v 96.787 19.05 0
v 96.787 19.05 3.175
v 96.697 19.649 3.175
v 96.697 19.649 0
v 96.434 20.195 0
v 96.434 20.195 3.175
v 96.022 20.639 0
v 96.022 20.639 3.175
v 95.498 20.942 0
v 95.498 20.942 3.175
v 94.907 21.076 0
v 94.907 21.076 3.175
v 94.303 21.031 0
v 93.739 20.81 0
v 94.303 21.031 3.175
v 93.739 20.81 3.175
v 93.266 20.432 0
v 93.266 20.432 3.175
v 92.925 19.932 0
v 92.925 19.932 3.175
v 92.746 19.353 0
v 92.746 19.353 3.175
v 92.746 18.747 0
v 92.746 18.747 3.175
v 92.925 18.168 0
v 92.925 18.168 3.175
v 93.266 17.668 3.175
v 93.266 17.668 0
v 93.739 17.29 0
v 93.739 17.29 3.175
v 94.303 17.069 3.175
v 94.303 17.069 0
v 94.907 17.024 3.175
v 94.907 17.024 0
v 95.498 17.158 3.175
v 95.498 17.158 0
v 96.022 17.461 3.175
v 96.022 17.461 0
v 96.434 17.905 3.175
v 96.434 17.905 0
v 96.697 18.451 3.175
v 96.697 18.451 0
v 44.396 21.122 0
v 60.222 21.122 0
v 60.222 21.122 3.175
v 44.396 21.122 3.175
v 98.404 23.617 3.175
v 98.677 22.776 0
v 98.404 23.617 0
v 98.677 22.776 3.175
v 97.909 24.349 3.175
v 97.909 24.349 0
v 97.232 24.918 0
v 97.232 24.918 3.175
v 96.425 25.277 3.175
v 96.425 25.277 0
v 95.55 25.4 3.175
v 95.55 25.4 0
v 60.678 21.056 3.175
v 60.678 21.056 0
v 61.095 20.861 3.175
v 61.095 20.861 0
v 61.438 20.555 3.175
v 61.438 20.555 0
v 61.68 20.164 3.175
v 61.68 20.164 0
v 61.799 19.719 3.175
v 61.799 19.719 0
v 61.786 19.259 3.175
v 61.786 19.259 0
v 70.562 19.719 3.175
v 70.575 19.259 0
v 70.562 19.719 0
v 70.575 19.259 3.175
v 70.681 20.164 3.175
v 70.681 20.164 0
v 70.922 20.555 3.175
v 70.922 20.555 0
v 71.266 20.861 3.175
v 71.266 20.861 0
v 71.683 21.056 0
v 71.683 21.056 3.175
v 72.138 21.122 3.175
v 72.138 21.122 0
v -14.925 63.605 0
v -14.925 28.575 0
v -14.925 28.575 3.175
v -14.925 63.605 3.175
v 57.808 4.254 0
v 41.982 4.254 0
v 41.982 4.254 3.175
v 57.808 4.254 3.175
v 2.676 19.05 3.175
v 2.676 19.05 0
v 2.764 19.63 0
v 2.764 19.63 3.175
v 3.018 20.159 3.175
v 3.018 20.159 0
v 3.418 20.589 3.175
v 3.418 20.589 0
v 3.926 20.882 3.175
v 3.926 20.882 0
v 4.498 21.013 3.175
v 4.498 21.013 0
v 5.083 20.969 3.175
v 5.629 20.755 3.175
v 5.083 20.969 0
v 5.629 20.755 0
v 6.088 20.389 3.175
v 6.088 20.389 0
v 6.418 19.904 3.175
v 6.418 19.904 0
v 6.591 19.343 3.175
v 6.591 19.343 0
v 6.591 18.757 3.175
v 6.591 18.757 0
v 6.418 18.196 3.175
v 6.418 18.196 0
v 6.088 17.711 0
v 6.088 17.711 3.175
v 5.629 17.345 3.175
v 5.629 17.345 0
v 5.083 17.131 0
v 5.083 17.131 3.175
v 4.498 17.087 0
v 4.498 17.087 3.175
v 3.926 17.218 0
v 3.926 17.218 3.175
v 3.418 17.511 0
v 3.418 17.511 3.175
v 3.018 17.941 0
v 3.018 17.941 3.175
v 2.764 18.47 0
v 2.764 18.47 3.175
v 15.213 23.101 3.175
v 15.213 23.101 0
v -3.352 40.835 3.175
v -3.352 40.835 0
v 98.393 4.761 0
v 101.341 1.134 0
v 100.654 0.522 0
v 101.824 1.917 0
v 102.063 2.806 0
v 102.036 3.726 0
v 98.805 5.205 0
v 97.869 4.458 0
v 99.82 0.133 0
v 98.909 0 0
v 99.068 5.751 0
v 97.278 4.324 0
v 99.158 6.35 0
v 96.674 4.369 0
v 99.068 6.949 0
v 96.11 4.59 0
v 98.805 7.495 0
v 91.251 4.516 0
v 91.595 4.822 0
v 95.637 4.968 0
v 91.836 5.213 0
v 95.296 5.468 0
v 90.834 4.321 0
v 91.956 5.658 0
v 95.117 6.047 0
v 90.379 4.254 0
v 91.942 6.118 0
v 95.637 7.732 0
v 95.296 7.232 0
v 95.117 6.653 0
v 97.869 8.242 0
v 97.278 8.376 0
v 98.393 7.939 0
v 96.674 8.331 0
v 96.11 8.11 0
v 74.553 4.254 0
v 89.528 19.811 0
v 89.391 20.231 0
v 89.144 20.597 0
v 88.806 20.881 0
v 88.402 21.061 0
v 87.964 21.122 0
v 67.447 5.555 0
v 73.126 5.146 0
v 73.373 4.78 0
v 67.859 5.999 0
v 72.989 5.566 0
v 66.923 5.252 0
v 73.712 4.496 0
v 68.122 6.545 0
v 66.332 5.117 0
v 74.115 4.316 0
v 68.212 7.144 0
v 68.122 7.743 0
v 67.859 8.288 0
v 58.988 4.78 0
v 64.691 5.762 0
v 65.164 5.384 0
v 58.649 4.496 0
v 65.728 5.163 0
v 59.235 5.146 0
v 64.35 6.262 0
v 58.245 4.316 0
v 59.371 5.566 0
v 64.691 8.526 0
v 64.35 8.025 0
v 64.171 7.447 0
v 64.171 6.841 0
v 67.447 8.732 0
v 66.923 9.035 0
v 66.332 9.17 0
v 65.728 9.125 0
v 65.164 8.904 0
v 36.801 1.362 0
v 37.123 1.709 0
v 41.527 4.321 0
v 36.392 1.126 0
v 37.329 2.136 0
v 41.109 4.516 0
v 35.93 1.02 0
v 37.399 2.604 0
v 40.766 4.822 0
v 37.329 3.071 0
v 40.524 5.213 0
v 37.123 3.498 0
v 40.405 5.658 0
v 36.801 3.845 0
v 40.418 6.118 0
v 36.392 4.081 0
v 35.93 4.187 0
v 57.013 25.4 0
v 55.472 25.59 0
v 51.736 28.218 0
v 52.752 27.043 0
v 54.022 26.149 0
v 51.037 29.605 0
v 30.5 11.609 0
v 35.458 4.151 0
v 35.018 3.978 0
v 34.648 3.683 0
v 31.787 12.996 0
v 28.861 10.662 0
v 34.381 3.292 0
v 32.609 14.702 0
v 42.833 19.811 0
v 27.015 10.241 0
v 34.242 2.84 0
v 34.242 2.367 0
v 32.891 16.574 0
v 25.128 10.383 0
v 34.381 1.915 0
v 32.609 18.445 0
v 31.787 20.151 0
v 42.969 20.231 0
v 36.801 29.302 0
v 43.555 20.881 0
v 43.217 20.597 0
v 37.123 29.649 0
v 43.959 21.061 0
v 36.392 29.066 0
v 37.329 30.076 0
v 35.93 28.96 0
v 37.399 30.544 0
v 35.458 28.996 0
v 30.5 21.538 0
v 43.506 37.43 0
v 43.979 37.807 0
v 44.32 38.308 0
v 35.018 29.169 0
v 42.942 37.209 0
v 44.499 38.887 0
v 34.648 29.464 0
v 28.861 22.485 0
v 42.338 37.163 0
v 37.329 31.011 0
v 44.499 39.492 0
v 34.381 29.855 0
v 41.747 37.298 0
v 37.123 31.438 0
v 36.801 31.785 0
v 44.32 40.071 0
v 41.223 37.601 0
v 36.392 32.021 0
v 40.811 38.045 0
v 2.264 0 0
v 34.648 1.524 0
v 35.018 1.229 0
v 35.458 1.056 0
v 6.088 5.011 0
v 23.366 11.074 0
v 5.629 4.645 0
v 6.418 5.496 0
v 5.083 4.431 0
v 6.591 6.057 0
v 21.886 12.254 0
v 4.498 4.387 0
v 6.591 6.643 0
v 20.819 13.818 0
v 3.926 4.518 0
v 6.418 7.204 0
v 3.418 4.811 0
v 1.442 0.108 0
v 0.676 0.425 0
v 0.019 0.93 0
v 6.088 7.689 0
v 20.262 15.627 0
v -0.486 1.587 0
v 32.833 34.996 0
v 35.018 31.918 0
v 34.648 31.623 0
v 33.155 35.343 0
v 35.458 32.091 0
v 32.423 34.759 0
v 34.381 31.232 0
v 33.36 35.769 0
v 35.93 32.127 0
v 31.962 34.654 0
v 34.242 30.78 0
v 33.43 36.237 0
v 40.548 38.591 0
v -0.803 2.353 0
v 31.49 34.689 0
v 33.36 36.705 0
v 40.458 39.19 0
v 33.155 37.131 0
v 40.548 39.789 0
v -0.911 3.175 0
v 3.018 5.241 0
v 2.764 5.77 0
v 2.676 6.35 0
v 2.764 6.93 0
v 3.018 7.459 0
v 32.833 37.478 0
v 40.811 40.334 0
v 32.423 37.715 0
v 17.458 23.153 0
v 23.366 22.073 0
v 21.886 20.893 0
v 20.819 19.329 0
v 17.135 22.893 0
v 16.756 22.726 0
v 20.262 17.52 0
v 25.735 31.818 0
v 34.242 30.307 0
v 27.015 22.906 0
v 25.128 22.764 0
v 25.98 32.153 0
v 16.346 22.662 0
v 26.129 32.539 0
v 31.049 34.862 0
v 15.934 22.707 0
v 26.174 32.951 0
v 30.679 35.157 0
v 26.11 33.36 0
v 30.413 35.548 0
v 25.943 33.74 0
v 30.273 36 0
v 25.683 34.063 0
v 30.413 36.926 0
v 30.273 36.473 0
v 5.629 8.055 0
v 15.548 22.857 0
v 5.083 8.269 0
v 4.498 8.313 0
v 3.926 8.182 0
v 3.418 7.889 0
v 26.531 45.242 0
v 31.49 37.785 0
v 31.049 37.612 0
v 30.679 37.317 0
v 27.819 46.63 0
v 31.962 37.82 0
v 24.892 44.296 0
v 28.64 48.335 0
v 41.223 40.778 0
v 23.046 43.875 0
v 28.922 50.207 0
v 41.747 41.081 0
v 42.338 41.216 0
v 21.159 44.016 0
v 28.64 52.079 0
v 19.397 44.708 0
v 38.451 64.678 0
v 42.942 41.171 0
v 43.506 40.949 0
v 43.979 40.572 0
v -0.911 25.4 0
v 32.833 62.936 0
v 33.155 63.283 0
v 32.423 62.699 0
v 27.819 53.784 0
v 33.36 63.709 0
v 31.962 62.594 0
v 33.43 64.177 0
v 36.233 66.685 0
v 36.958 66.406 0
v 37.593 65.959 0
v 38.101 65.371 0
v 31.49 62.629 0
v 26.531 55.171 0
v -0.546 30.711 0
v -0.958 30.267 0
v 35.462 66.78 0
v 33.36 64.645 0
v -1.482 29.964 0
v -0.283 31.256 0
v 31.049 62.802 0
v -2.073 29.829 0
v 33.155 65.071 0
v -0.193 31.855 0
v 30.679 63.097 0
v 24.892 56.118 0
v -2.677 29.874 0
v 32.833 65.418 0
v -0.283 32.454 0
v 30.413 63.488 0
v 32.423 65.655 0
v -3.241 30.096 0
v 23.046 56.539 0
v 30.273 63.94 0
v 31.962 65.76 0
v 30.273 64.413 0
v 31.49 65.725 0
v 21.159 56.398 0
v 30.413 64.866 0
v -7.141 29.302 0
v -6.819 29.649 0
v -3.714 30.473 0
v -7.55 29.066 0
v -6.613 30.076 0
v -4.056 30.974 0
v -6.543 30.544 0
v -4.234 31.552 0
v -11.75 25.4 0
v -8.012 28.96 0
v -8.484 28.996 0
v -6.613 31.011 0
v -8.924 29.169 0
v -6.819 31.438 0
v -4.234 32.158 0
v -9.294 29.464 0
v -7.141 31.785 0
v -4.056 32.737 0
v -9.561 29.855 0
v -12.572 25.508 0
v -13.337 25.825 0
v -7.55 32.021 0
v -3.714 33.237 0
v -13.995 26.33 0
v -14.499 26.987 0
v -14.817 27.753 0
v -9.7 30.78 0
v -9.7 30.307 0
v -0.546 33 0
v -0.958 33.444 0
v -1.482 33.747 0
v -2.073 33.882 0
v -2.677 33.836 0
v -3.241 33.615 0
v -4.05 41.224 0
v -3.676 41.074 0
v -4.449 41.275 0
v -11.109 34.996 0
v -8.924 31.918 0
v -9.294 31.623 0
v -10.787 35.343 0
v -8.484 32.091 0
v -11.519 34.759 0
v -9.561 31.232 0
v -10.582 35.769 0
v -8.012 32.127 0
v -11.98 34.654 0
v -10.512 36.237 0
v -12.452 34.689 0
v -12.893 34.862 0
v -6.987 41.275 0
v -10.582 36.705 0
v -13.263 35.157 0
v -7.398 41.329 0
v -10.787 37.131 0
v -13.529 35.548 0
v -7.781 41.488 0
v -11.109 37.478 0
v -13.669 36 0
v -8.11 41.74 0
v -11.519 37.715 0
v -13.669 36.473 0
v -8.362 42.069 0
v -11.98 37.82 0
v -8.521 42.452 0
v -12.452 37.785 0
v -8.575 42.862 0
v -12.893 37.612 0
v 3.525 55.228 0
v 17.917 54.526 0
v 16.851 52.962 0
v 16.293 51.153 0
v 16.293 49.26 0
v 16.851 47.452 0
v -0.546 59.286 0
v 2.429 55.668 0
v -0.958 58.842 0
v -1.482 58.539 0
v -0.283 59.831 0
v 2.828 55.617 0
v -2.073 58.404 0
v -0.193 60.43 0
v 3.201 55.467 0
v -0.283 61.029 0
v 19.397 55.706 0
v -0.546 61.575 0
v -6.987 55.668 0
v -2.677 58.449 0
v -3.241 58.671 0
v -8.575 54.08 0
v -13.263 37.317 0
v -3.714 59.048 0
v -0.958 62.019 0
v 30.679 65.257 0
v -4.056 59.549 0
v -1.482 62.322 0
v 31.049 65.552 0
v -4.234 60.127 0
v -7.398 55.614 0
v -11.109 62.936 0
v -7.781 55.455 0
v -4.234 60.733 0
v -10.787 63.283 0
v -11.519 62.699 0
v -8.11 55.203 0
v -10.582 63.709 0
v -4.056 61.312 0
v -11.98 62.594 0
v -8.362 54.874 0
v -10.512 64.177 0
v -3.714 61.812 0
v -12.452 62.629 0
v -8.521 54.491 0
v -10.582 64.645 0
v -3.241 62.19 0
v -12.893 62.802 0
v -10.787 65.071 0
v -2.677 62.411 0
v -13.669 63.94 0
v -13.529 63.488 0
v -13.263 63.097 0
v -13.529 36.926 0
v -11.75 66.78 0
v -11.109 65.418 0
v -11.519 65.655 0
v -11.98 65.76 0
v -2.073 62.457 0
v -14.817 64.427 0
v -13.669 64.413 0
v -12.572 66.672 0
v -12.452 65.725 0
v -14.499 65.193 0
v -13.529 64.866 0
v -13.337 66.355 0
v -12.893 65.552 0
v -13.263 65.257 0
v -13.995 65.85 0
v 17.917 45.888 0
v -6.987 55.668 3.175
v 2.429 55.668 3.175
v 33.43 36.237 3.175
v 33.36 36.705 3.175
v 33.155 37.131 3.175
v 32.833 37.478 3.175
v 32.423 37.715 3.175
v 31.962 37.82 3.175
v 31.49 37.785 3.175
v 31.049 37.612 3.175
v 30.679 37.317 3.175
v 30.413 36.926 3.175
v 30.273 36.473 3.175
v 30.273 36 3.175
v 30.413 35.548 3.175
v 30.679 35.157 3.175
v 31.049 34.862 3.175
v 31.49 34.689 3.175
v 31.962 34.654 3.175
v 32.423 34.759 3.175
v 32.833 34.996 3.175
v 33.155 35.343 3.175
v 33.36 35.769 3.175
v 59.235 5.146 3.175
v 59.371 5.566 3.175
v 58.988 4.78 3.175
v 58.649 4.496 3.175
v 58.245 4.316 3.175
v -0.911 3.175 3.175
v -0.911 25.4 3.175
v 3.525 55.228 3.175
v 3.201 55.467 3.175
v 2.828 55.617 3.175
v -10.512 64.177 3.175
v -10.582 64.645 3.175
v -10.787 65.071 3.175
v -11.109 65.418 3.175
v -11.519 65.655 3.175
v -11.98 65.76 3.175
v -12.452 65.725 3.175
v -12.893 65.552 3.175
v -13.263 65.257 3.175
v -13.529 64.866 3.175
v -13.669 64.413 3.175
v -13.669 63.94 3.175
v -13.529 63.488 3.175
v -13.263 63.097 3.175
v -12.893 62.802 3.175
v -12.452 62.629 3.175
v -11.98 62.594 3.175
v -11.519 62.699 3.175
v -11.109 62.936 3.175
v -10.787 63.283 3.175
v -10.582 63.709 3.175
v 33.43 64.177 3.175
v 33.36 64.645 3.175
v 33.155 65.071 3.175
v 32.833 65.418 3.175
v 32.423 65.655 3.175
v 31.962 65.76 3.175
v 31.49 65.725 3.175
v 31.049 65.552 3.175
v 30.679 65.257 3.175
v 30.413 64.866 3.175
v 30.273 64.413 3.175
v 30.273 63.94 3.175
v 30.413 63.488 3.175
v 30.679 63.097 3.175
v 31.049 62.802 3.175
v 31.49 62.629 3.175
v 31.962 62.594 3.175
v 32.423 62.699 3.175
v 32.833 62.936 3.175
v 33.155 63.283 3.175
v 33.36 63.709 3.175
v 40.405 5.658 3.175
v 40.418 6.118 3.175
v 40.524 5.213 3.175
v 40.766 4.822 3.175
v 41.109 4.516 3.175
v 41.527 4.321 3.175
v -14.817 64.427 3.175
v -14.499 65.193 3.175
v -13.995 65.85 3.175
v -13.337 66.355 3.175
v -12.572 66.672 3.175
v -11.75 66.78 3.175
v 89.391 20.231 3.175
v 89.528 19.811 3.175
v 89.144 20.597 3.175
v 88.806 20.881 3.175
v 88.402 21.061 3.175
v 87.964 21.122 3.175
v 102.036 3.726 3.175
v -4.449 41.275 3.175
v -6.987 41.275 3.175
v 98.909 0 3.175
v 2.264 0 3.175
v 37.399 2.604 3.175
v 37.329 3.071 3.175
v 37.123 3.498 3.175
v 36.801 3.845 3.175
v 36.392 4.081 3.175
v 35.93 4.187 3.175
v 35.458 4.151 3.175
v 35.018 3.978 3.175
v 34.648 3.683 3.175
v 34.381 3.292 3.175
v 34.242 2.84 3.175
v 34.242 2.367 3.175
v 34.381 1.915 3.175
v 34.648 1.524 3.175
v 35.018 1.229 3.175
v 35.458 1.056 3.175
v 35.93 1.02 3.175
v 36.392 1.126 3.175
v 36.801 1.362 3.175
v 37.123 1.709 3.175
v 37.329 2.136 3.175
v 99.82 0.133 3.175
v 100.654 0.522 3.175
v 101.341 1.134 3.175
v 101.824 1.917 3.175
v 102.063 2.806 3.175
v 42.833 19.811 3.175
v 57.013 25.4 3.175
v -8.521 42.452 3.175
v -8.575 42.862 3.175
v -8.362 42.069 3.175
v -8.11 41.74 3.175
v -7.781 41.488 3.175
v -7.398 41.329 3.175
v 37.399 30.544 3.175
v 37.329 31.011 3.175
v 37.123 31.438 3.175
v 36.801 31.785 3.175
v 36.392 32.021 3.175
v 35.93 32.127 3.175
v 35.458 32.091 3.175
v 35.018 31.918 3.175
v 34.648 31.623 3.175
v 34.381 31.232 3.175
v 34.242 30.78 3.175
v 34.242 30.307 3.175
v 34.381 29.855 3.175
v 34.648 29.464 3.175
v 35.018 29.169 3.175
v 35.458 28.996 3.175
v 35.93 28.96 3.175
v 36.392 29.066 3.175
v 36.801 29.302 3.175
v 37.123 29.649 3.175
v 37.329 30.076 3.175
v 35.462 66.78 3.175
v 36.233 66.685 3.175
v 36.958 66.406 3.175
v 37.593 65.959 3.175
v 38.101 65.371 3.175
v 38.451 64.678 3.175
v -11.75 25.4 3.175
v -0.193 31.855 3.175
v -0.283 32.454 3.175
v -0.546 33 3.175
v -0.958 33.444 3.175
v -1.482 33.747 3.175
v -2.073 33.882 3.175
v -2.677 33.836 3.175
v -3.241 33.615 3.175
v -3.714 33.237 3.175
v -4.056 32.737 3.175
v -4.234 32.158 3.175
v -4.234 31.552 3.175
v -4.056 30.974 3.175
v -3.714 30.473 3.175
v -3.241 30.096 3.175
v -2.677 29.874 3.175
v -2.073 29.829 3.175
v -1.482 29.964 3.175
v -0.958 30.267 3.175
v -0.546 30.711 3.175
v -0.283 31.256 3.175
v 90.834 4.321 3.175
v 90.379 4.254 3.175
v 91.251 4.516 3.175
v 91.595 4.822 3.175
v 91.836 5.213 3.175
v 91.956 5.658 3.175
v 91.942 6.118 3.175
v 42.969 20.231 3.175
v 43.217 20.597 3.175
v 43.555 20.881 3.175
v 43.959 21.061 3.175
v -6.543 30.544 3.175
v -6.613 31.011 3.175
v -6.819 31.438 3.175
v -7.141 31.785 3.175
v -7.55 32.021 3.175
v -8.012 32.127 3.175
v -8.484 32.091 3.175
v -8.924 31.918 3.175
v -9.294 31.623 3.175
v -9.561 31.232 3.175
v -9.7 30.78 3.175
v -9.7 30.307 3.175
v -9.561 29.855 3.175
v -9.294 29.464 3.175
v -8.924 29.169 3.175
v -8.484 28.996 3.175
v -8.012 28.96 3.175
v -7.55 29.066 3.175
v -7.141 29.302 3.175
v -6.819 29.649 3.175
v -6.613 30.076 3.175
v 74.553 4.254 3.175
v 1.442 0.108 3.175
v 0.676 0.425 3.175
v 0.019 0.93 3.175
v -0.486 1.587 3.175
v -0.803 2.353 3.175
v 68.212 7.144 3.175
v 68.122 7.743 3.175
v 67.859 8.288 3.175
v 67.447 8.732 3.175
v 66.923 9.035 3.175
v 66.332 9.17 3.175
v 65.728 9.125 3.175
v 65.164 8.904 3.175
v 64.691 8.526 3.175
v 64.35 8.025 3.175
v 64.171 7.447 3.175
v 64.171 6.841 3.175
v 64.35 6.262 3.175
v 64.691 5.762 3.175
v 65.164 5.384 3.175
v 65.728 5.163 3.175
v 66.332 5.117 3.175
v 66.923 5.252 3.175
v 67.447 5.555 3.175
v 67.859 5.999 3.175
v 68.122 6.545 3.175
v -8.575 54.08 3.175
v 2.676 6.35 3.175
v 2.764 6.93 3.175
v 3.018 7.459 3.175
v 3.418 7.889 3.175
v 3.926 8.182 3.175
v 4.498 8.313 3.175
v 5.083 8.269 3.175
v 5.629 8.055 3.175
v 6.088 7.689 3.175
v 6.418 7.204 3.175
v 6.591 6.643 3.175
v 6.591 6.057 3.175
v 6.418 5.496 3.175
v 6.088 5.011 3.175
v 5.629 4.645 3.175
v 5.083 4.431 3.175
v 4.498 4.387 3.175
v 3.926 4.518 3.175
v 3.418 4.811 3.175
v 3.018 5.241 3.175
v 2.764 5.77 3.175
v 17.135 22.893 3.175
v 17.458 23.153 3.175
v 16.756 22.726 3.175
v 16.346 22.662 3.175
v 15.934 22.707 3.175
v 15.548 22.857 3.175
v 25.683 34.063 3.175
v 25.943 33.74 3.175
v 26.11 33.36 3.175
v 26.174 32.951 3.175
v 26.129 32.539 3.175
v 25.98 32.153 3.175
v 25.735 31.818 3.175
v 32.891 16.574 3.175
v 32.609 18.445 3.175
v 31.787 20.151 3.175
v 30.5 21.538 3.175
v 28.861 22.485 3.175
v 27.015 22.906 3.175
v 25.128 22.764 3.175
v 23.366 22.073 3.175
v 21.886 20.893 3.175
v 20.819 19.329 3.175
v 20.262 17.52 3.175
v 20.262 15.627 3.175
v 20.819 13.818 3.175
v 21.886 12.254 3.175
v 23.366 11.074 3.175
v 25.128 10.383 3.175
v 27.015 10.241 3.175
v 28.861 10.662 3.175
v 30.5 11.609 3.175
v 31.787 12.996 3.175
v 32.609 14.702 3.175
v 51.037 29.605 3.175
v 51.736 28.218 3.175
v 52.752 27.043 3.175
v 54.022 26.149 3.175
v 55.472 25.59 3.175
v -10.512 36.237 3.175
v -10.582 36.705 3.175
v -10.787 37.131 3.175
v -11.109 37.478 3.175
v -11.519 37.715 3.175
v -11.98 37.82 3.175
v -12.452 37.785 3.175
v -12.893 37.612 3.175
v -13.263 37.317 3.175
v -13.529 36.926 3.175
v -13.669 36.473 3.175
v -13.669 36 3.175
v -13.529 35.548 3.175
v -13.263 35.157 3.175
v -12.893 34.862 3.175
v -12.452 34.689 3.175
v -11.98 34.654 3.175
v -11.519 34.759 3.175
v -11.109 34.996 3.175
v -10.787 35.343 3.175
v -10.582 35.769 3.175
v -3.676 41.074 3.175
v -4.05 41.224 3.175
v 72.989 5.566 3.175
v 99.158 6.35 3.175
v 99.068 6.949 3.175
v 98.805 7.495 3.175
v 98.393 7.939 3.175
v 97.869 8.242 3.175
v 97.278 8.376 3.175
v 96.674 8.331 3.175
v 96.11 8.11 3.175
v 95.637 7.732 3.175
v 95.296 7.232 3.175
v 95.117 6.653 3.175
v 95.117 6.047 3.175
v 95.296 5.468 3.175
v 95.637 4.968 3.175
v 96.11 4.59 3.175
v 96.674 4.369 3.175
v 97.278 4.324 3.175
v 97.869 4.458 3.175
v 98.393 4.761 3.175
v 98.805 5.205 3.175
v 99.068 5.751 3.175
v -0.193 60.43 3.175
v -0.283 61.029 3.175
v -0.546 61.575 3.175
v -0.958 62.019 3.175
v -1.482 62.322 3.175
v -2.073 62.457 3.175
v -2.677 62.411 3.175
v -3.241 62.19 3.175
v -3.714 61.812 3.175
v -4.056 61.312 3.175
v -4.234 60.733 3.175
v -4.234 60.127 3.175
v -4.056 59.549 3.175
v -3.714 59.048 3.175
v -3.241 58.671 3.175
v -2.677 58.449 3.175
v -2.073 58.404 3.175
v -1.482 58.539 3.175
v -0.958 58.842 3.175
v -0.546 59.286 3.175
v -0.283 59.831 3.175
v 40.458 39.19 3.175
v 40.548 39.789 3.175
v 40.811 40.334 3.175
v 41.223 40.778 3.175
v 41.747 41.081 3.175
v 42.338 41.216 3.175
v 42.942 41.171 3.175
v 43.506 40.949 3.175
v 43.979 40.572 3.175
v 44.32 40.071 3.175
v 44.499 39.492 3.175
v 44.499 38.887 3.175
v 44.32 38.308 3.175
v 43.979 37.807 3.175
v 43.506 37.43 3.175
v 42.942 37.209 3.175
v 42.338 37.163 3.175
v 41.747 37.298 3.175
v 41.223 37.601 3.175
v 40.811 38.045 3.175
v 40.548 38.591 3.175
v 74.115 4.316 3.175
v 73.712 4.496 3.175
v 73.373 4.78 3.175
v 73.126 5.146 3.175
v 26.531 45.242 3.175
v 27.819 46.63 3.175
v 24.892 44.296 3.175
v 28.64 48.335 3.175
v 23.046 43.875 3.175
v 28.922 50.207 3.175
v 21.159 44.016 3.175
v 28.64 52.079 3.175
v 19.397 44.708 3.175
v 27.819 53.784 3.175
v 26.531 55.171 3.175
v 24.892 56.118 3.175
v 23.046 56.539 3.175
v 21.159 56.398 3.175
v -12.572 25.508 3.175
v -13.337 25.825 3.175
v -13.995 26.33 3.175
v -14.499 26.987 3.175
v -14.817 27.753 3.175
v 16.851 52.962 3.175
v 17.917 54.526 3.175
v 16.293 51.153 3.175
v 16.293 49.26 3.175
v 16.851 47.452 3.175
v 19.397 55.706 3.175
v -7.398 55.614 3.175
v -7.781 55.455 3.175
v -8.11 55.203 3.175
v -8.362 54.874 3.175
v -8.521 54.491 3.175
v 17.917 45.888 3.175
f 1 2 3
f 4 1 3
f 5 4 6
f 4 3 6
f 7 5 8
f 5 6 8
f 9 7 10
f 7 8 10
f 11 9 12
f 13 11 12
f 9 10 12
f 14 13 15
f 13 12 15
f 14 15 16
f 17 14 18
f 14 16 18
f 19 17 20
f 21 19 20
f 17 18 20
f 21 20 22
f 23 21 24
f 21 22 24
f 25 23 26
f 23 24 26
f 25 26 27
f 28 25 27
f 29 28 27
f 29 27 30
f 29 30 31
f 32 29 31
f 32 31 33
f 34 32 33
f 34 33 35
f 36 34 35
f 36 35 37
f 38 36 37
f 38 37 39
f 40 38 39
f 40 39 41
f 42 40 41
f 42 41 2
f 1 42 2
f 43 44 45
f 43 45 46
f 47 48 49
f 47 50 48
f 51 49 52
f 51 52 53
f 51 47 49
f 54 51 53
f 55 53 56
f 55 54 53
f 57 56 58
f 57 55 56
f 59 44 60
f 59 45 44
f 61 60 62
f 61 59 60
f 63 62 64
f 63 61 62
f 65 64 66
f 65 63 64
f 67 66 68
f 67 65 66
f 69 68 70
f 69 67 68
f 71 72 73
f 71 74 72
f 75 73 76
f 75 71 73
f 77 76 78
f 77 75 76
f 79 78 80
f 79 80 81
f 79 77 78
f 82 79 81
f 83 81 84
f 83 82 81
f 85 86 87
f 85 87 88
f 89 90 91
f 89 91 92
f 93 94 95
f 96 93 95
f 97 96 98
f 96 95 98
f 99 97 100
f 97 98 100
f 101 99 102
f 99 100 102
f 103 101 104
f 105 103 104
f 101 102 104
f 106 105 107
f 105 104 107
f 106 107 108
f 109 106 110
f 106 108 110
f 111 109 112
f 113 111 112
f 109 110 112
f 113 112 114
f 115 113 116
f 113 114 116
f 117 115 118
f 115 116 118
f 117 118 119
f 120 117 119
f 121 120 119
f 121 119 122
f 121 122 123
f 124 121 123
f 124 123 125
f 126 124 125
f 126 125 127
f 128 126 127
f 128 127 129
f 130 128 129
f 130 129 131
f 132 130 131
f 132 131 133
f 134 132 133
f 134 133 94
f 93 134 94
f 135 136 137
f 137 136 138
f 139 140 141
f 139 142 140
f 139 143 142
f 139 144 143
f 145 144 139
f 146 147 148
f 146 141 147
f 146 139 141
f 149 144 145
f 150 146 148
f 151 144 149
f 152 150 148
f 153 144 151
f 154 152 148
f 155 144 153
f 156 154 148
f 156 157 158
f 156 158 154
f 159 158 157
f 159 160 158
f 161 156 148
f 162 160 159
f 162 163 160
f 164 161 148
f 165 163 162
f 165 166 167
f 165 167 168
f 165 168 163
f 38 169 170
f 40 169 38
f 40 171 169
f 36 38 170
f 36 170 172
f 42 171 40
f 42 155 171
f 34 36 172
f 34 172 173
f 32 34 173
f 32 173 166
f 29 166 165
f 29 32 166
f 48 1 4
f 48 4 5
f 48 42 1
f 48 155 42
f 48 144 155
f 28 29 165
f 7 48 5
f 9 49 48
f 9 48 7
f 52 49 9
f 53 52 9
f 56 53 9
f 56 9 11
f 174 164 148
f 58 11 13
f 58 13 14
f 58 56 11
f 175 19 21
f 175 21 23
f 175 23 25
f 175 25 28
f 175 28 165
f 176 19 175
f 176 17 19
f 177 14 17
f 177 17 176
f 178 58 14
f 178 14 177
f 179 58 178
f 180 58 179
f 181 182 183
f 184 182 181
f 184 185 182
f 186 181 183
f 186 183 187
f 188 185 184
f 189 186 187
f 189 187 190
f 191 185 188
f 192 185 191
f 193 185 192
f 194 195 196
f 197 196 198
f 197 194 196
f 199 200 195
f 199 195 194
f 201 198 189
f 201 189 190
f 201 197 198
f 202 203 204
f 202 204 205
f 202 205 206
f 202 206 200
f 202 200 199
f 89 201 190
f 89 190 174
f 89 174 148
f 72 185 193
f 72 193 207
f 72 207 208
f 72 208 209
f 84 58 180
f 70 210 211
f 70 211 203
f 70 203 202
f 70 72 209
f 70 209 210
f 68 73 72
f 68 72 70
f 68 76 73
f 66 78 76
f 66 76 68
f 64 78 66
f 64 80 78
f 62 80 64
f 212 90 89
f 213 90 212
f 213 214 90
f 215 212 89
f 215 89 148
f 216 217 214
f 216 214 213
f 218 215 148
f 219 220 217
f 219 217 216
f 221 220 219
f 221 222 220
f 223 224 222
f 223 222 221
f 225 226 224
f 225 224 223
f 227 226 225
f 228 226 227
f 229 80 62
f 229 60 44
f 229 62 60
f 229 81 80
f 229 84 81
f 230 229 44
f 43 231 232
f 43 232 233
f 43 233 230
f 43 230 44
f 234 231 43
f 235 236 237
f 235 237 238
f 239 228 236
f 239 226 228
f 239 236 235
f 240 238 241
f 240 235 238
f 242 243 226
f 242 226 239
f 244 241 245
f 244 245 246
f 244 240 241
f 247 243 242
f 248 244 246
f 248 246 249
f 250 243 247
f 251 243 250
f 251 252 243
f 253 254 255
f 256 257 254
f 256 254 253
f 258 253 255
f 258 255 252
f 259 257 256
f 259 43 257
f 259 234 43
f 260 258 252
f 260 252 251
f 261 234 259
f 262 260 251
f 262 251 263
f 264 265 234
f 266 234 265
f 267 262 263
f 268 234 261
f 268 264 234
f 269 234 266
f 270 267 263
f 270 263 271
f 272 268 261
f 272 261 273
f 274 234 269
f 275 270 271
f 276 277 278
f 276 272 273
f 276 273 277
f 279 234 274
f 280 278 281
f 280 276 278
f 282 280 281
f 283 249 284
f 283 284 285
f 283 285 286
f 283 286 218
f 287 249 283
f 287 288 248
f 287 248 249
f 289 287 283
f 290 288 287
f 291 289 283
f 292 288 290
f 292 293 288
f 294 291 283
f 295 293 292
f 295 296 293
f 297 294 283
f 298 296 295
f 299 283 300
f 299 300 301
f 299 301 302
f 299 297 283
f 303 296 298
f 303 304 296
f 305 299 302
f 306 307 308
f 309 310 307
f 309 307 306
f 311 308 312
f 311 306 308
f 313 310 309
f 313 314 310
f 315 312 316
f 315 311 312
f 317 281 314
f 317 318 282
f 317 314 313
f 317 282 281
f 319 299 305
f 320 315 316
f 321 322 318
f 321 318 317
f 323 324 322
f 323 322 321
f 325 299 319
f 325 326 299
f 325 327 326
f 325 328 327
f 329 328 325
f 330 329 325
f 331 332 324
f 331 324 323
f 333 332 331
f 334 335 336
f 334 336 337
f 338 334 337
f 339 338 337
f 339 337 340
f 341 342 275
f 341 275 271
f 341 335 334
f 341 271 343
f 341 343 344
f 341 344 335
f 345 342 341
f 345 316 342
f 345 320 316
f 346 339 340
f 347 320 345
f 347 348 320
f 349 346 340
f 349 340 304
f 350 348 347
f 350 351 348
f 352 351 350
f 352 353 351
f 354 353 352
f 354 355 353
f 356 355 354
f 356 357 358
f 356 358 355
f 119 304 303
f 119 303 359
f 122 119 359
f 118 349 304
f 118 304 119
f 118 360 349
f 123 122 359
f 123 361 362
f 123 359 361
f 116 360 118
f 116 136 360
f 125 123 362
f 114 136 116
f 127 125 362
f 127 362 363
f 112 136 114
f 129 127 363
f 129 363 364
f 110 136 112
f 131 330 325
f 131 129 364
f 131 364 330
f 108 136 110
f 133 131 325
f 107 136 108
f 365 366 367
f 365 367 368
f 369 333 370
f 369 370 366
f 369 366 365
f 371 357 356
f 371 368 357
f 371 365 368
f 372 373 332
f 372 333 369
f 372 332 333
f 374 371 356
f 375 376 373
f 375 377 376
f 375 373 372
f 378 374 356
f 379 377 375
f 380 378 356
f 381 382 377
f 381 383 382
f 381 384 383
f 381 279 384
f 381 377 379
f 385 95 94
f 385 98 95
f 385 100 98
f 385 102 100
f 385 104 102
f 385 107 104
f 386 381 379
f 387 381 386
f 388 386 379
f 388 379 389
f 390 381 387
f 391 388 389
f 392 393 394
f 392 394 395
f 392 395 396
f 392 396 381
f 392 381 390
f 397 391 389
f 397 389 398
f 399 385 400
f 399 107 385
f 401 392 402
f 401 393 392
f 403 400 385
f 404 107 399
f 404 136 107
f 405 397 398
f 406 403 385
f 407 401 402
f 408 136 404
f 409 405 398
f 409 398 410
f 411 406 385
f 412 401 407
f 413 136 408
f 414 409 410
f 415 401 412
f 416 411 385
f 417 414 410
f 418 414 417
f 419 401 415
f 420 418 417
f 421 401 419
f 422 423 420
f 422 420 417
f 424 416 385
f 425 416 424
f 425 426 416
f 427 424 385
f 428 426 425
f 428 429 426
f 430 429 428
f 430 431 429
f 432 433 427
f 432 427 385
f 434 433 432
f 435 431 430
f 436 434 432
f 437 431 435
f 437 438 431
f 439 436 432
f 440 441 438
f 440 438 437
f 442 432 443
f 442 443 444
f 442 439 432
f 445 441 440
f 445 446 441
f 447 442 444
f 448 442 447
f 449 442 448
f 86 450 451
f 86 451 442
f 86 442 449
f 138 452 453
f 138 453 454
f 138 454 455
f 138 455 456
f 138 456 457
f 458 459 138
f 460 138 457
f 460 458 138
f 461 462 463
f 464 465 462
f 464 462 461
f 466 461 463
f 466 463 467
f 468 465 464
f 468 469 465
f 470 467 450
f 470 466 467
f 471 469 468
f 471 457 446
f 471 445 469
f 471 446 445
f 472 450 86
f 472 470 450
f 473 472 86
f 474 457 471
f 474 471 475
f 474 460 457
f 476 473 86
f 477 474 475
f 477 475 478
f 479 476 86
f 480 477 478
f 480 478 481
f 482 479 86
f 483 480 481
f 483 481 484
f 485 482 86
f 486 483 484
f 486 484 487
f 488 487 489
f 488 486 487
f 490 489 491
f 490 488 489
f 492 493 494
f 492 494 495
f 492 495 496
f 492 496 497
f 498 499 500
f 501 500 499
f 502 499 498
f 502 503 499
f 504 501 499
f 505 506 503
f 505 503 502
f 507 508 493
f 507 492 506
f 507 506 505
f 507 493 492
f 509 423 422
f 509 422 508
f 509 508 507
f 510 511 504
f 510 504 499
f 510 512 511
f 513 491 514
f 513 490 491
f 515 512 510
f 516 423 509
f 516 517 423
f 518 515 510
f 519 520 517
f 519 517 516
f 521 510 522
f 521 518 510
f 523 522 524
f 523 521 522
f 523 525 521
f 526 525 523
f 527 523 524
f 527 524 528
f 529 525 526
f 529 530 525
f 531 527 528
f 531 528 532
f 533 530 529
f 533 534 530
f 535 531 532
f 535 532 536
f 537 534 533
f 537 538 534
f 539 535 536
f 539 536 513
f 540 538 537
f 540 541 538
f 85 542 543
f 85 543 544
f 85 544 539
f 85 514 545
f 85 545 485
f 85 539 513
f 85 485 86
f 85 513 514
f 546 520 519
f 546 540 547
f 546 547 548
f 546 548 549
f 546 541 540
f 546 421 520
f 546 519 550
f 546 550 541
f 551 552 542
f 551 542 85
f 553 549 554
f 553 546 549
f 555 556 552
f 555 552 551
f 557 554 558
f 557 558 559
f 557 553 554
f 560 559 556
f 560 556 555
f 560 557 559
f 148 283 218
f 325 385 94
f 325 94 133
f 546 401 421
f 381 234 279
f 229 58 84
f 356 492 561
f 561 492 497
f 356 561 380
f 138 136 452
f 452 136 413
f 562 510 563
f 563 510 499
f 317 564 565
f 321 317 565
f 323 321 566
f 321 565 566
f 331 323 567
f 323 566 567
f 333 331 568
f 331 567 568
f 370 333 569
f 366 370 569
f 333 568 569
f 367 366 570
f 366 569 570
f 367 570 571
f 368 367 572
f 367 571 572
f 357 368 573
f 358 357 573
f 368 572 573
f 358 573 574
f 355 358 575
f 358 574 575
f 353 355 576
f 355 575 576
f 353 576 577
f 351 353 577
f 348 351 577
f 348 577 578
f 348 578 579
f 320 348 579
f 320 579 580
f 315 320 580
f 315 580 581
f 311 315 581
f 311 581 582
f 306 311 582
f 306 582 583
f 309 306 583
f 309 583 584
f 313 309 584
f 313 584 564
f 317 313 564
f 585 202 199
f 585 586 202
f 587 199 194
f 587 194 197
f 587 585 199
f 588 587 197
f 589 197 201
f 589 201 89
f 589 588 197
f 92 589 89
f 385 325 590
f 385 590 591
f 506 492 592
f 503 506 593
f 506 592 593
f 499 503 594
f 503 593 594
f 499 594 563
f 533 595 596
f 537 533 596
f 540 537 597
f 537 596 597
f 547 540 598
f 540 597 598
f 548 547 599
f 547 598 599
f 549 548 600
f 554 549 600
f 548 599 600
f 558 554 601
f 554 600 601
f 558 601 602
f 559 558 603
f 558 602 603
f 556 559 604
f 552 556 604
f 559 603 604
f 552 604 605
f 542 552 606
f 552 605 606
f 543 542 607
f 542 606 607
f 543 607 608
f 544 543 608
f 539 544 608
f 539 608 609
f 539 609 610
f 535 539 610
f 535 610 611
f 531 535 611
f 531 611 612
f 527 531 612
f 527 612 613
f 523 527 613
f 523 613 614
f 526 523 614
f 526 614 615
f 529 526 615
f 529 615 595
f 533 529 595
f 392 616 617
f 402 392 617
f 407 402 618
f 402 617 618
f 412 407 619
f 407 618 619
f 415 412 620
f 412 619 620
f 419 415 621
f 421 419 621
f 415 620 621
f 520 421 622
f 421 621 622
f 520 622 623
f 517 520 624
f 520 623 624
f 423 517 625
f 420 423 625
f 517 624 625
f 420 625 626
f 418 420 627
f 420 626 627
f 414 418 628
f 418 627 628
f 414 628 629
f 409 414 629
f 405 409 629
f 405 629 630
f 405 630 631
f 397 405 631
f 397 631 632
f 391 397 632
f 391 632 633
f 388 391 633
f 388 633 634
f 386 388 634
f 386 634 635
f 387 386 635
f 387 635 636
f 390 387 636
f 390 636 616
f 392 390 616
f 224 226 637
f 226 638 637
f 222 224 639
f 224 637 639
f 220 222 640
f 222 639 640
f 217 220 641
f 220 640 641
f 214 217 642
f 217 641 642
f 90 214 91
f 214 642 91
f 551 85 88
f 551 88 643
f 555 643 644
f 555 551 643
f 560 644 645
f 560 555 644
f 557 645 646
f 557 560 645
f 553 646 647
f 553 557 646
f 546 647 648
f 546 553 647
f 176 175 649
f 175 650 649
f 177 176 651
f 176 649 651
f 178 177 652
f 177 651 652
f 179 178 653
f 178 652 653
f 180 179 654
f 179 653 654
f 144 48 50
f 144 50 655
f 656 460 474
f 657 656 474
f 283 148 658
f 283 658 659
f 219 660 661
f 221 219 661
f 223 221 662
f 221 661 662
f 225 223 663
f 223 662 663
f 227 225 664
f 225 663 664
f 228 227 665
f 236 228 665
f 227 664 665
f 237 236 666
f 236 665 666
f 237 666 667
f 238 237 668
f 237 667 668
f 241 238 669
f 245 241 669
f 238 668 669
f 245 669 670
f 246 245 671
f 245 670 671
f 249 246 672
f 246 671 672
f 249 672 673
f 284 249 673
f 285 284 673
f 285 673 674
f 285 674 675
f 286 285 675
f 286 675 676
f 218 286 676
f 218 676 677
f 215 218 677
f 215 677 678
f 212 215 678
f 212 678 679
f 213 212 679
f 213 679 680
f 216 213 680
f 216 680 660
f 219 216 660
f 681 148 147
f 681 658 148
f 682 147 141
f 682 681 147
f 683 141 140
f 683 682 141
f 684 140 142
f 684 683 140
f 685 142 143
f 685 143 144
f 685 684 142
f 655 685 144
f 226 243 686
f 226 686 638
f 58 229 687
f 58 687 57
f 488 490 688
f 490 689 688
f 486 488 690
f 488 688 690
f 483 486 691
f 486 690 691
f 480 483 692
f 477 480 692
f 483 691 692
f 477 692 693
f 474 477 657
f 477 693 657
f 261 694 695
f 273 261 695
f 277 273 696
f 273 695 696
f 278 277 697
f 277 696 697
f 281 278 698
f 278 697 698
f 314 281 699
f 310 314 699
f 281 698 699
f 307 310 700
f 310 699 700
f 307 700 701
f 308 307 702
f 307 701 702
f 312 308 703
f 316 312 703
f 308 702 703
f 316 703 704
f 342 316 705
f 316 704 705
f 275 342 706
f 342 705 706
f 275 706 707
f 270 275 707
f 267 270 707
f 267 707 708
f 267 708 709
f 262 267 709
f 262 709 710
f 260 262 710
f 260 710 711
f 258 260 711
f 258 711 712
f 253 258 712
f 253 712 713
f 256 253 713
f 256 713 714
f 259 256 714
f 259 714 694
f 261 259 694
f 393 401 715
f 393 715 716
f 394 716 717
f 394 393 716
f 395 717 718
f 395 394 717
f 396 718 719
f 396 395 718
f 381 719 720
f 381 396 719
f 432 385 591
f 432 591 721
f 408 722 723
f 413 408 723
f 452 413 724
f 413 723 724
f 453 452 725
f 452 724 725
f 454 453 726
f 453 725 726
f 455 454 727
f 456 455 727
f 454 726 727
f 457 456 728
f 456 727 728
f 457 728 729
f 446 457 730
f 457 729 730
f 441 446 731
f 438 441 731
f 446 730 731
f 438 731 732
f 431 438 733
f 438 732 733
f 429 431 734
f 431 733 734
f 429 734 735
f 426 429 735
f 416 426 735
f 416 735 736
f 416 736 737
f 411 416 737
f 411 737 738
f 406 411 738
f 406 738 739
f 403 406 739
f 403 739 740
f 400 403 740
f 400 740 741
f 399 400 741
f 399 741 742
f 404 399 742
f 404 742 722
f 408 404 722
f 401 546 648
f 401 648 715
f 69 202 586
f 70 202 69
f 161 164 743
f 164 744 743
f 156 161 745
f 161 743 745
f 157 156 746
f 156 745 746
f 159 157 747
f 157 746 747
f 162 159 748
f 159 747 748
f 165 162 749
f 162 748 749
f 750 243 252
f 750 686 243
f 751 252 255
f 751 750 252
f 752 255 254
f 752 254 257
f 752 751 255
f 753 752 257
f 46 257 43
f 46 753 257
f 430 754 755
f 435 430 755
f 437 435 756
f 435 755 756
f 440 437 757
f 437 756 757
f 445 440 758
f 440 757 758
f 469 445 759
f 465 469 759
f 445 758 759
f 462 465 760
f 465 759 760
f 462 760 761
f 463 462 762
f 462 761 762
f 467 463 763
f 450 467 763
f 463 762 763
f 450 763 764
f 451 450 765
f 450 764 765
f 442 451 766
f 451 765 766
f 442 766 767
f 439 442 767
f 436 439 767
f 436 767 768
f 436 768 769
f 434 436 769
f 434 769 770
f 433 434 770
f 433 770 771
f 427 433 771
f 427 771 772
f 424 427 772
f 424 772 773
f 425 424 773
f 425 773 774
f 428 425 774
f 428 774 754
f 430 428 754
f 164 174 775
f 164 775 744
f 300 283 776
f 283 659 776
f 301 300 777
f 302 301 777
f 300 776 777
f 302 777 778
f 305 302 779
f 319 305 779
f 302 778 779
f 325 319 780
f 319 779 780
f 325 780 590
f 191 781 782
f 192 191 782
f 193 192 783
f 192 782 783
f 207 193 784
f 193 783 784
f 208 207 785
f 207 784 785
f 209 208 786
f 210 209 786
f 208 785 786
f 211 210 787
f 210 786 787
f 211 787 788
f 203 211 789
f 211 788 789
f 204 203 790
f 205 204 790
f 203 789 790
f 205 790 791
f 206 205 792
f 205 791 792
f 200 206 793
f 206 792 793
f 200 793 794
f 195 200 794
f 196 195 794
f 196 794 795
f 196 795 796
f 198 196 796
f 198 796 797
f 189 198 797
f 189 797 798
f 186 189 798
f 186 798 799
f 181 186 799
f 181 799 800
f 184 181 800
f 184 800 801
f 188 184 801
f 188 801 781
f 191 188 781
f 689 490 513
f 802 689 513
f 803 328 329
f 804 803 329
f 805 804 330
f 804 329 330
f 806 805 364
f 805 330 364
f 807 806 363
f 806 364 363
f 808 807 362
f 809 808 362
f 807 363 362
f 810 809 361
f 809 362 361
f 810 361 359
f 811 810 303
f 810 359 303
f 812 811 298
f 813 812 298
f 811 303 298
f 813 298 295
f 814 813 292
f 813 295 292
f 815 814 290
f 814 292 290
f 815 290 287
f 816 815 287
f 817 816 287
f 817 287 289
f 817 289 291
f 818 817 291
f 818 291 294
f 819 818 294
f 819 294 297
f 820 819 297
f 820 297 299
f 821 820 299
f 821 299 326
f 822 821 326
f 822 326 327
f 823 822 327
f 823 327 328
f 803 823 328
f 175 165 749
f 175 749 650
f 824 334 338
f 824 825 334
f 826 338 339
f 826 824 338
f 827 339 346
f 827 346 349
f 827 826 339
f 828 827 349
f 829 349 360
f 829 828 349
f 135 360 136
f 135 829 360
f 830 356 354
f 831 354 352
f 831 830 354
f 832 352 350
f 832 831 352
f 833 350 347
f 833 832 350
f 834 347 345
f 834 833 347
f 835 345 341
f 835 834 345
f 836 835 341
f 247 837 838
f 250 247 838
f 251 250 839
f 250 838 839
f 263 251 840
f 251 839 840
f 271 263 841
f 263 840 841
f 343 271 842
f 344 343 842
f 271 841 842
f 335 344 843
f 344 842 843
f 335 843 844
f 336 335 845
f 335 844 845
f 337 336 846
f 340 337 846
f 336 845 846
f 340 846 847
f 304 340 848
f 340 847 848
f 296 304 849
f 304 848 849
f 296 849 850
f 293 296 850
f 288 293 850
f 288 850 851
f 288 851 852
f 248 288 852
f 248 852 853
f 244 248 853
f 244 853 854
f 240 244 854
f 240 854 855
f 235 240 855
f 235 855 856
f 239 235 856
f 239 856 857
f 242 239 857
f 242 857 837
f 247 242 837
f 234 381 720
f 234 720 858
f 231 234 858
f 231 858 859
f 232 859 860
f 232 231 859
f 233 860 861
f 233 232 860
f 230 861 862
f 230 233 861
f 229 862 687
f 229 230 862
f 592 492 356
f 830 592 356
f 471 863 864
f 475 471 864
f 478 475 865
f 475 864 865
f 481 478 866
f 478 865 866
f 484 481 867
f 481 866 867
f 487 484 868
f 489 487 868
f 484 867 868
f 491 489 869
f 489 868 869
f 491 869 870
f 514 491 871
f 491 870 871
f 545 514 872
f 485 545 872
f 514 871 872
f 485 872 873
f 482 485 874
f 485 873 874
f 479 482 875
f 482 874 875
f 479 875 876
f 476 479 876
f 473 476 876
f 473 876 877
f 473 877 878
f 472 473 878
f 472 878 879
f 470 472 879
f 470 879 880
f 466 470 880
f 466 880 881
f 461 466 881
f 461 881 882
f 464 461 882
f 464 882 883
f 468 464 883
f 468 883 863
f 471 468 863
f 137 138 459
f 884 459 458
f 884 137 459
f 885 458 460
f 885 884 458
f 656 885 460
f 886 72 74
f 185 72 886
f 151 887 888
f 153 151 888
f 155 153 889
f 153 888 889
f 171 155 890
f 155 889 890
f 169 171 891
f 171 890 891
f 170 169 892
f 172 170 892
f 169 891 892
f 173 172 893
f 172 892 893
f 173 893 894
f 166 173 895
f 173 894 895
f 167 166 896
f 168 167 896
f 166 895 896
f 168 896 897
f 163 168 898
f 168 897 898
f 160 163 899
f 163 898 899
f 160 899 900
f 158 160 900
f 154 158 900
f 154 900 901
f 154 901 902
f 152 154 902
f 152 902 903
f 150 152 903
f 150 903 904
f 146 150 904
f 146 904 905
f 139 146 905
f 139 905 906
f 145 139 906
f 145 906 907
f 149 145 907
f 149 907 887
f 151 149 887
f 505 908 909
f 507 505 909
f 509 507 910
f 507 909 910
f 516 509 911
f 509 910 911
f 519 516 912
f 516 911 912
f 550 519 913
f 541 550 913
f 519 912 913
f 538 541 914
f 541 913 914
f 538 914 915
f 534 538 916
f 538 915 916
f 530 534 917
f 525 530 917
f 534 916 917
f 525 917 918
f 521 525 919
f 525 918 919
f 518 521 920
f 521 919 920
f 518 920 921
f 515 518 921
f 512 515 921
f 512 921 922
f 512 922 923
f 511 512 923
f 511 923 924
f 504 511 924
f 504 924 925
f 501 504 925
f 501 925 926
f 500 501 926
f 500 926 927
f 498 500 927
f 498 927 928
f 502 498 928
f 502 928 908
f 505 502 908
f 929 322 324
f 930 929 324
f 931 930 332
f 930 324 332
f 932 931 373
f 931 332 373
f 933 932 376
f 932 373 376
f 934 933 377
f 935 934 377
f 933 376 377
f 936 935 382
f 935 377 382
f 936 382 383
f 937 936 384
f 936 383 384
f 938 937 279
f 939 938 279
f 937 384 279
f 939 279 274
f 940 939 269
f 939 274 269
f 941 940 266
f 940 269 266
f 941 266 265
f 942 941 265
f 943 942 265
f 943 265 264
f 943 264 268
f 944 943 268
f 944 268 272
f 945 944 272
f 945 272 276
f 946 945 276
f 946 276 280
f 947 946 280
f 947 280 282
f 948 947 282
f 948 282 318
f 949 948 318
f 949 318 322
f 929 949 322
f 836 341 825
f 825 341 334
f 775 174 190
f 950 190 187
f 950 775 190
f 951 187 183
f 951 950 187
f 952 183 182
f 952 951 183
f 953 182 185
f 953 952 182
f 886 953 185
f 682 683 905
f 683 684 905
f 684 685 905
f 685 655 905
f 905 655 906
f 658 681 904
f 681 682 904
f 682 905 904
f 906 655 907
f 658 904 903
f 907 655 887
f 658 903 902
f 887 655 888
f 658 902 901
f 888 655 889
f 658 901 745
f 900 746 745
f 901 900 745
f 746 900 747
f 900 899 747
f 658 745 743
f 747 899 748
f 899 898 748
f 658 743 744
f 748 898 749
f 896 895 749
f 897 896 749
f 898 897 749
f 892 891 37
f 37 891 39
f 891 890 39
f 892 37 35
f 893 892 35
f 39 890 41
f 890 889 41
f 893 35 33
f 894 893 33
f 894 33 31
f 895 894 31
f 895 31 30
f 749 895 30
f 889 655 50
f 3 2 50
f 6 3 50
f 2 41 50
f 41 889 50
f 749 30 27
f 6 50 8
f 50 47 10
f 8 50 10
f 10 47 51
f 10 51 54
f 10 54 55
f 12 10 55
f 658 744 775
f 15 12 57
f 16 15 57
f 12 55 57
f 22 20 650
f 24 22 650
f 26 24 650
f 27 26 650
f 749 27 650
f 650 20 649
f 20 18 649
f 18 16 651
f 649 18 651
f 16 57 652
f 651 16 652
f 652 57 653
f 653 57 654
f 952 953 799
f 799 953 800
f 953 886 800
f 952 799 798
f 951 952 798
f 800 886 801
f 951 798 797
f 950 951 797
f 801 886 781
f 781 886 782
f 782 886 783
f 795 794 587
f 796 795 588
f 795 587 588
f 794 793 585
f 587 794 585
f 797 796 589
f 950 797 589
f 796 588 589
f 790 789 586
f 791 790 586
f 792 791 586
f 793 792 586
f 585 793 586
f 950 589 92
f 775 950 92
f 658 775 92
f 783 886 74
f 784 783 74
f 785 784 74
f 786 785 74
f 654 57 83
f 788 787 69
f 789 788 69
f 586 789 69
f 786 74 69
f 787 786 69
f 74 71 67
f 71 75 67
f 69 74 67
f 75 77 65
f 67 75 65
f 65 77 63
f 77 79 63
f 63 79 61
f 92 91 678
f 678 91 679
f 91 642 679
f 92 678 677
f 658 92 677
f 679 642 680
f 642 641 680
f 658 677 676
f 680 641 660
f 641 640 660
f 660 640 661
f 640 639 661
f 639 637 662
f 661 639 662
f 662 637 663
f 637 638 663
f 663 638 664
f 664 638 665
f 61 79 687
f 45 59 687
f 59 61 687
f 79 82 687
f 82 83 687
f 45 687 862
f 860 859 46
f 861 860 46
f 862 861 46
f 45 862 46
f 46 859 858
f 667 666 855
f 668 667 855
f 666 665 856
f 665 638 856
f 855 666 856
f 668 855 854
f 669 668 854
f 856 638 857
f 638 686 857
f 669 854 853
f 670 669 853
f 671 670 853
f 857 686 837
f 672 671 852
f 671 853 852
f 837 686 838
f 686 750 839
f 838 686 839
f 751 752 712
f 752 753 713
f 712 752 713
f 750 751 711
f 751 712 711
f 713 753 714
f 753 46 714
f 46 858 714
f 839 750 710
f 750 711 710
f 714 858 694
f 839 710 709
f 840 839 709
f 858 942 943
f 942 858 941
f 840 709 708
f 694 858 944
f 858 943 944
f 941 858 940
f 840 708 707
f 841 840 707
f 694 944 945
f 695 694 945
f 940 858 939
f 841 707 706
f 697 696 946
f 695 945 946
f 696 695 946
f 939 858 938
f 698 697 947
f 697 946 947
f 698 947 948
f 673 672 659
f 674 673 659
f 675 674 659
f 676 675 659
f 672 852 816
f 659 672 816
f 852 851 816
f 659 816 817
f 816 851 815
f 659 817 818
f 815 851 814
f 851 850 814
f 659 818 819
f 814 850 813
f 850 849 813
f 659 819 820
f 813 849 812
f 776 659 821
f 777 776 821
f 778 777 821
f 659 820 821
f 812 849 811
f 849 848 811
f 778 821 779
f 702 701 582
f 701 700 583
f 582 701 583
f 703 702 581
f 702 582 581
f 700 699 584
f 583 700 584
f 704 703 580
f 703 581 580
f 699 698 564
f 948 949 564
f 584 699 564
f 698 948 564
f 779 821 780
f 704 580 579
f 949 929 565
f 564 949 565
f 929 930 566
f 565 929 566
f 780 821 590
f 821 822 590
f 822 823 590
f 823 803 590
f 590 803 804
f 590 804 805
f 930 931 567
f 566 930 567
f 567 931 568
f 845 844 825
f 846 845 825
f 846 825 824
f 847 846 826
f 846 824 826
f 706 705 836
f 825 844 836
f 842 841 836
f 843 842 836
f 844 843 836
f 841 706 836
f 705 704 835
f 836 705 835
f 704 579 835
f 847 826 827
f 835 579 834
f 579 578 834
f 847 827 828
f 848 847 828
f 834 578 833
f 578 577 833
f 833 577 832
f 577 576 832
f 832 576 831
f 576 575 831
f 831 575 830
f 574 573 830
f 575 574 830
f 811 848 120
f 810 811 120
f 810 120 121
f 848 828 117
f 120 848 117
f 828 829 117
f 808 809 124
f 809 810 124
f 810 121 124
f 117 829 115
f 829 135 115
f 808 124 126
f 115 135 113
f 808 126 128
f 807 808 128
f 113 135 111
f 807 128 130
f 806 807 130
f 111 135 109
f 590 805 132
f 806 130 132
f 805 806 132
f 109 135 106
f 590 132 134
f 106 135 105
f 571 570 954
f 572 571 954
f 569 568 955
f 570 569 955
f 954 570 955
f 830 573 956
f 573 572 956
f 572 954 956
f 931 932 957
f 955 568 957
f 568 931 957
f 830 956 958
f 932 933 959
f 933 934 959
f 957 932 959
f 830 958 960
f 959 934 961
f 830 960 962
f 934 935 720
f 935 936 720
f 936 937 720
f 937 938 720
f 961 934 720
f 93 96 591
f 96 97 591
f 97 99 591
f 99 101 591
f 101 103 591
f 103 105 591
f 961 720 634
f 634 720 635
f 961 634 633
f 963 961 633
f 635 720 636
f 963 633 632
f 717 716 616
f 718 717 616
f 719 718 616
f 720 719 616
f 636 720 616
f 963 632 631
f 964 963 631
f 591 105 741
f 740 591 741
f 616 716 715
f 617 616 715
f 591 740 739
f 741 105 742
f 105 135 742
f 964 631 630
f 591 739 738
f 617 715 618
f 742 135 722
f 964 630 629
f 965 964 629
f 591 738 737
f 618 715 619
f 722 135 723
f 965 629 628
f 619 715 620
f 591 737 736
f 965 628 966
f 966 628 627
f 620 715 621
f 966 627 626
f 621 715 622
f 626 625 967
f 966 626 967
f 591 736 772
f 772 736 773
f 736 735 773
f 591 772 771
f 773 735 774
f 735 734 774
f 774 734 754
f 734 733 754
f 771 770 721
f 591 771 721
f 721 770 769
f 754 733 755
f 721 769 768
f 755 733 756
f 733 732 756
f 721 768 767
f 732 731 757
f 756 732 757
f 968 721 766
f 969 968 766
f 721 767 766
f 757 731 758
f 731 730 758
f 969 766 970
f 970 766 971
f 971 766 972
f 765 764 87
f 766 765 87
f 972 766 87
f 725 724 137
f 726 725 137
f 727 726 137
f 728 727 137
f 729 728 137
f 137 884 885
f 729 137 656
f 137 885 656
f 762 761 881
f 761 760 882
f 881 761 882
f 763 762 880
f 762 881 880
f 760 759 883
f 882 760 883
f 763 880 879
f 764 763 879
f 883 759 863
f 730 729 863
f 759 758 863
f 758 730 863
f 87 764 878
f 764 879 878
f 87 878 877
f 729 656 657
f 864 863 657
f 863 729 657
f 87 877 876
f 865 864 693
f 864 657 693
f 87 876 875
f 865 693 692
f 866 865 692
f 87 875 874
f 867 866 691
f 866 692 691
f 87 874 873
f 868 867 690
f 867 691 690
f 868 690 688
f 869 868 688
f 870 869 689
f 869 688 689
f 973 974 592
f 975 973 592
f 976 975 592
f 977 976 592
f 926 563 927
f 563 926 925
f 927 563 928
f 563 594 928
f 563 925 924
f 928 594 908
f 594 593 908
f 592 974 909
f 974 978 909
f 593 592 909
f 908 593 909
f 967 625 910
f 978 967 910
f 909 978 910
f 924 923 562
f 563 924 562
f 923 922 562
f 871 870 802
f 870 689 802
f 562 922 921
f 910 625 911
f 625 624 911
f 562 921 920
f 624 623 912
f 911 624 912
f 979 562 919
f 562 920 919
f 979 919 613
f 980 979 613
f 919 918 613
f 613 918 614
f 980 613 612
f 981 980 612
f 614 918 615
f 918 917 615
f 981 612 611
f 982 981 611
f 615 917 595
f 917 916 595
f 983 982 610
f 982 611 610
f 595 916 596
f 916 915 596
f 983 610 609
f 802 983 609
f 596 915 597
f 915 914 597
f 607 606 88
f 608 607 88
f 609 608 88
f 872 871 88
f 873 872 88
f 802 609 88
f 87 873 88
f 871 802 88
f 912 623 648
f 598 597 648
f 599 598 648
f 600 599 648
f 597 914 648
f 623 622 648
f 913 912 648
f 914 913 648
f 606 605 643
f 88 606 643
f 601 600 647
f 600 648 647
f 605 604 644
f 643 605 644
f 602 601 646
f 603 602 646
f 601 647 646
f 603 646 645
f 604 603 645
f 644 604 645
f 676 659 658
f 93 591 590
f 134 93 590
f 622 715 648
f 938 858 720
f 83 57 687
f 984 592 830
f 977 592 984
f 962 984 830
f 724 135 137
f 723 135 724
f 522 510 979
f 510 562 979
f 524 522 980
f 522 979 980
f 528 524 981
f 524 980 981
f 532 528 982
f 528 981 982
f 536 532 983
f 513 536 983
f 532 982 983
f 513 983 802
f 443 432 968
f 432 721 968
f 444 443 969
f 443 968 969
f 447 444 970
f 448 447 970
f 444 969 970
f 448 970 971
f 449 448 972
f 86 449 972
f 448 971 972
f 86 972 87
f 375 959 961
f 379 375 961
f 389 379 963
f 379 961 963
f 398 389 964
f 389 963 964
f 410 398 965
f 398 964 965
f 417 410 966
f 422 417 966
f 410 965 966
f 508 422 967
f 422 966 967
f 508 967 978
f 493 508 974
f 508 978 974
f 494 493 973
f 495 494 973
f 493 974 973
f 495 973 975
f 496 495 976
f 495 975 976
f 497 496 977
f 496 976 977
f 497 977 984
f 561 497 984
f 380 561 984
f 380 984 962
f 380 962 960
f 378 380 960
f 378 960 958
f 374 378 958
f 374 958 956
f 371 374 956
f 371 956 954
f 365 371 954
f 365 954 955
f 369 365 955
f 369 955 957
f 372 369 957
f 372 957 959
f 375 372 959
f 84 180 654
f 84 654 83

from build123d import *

# Parameters (mm, degrees)
BOSS_EXTRUDE1_DEPTH = 3.175
SKETCH2_R           = 6.35
SKETCH2_R_2         = 1.5875
SKETCH2_R_3         = 2.032
CUT_EXTRUDE1_DEPTH  = 123.537765163
SKETCH3_R           = 2.032
SKETCH3_R_2         = 1.9685
CUT_EXTRUDE2_DEPTH  = 123.537765163
FILLET1_R           = 3.175
SKETCH4_R           = 2.032
CUT_EXTRUDE3_DEPTH  = 123.027997459
CUT_EXTRUDE4_REACH  = 124.028
FILLET2_R           = 1.5875


with BuildPart() as part:
    # Sketch1 → Boss-Extrude1 (new body)
    with BuildSketch(Plane.XY):
        with BuildLine():
            Line((102.692805421, 0), (-0.911395616, 0))
            Line((-0.911395616, 0), (-0.911395616, 25.4))
            Line((-0.911395616, 25.4), (-14.924855892, 25.4))
            Line((-14.924855892, 25.4), (-14.924855892, 63.605318816))
            ThreePointArc((-14.924855892, 63.605318816), (-13.994919922, 65.850382846), (-11.749855892, 66.780318816))
            Line((-11.749855892, 66.780318816), (35.462394108, 66.780318816))
            ThreePointArc((35.462394108, 66.780318816), (37.289381836, 66.201997626), (38.450803758, 64.677714623))
            Line((38.450803758, 64.677714623), (51.036631355, 29.605208386))
            ThreePointArc((51.036631355, 29.605208386), (53.359475199, 26.556642379), (57.013450653, 25.4))
            Line((57.013450653, 25.4), (98.214100111, 25.4))
            Line((98.214100111, 25.4), (102.692805421, 0))
        make_face()
    extrude(amount=BOSS_EXTRUDE1_DEPTH)

    # Sketch2 → Cut-Extrude1 (cut, through all)
    with BuildSketch(Plane.XY.offset(3.175)):
        with Locations((22.571894108, 50.206818816)):
            Circle(SKETCH2_R)
        with Locations((26.540644108, 16.5735)):
            Circle(SKETCH2_R)
        with Locations((-8.130355892, 30.5435)):
            Circle(SKETCH2_R_2)
        with Locations((35.811644108, 30.5435)):
            Circle(SKETCH2_R_2)
        with Locations((35.811644108, 2.6035)):
            Circle(SKETCH2_R_2)
        with Locations((-8.130355892, 2.6035)):
            Circle(SKETCH2_R_2)
        with Locations((-12.099105892, 36.236818816)):
            Circle(SKETCH2_R_2)
        with Locations((31.842894108, 36.236818816)):
            Circle(SKETCH2_R_2)
        with Locations((31.842894108, 64.176818816)):
            Circle(SKETCH2_R_2)
        with Locations((-12.099105892, 64.176818816)):
            Circle(SKETCH2_R_2)
        with Locations((66.180305421, 7.14375)):
            Circle(SKETCH2_R_3)
    extrude(amount=-CUT_EXTRUDE1_DEPTH, mode=Mode.SUBTRACT)

    # Sketch3 → Cut-Extrude2 (cut, through all)
    with BuildSketch(Plane(origin=(0, 0, 0), x_dir=(-1, 0, 0), z_dir=(0, 0, -1))):
        with Locations((-42.489558108, 39.189568816)):
            Circle(SKETCH3_R)
        with Locations((-4.644854384, 19.05)):
            Circle(SKETCH3_R_2)
        with Locations((-4.644854384, 6.35)):
            Circle(SKETCH3_R_2)
    extrude(amount=-CUT_EXTRUDE2_DEPTH, mode=Mode.SUBTRACT)

    # Fillet1
    fillet1_edges = [part.edges().sort_by_distance(p)[0] for p in [
        (-14.924855892, 25.4, 1.5875),
        (98.214100111, 25.4, 1.5875),
        (102.692805421, 0, 1.5875),
        (-0.911395616, 0, 1.5875),
    ]]
    fillet(fillet1_edges, radius=FILLET1_R)

    # Sketch4 → Cut-Extrude3 (cut, through all)
    with BuildSketch(Plane.XY.offset(3.175)):
        with Locations((94.755305421, 19.05)):
            Circle(SKETCH4_R)
        with Locations((97.126377465, 6.35)):
            Circle(SKETCH4_R)
        with Locations((-2.224855892, 60.430318816)):
            Circle(SKETCH4_R)
        with Locations((-2.224855892, 31.855318816)):
            Circle(SKETCH4_R)
    extrude(amount=-CUT_EXTRUDE3_DEPTH, mode=Mode.SUBTRACT)

    # Sketch5 → Cut-Extrude4 (cut, up to next)
    with BuildSketch(Plane(origin=(0, 0, 0), x_dir=(-1, 0, 0), z_dir=(0, 0, -1)), mode=Mode.PRIVATE) as cut_extrude4_sk1:
        Polygon((-3.064970502, 55.667818816), (-26.831361929, 32.965995206), (-16.361313511, 22.004969641), (3.812355892, 41.275), (8.574855892, 41.275), (8.574855892, 55.667818816), align=None)
    cut_extrude4_tool1 = extrude(cut_extrude4_sk1.sketch, amount=-CUT_EXTRUDE4_REACH, mode=Mode.PRIVATE) & part.part
    # Sketch5 → Cut-Extrude4 (cut, up to next)
    with BuildSketch(Plane(origin=(0, 0, 0), x_dir=(-1, 0, 0), z_dir=(0, 0, -1)), mode=Mode.PRIVATE) as cut_extrude4_sk2:
        Polygon((-92.270683803, 4.2545), (-89.29642955, 21.122334072), (-70.24642955, 21.122334072), (-73.220683803, 4.2545), align=None)
    cut_extrude4_tool2 = extrude(cut_extrude4_sk2.sketch, amount=-CUT_EXTRUDE4_REACH, mode=Mode.PRIVATE) & part.part
    # Sketch5 → Cut-Extrude4 (cut, up to next)
    with BuildSketch(Plane(origin=(0, 0, 0), x_dir=(-1, 0, 0), z_dir=(0, 0, -1)), mode=Mode.PRIVATE) as cut_extrude4_sk3:
        Polygon((-40.089927038, 4.2545), (-59.139927038, 4.2545), (-62.114181291, 21.122334072), (-43.064181291, 21.122334072), align=None)
    cut_extrude4_tool3 = extrude(cut_extrude4_sk3.sketch, amount=-CUT_EXTRUDE4_REACH, mode=Mode.PRIVATE) & part.part
    add(cut_extrude4_tool1.solids().sort_by_distance((7.67675, 40.461869, 0))[0], mode=Mode.SUBTRACT)
    add(cut_extrude4_tool2.solids().sort_by_distance((81.258557, 12.688417, 0))[0], mode=Mode.SUBTRACT)
    add(cut_extrude4_tool3.solids().sort_by_distance((51.102054, 12.688417, 0))[0], mode=Mode.SUBTRACT)

    # Fillet2
    fillet2_edges = [part.edges().sort_by_distance(p)[0] for p in [
        (3.064970502, 55.667818816, 1.5875),
        (-8.574855892, 55.667818816, 1.5875),
        (-8.574855892, 41.275, 1.5875),
        (-3.812355892, 41.275, 1.5875),
        (16.361313511, 22.004969641, 1.5875),
        (26.831361929, 32.965995206, 1.5875),
        (73.220683803, 4.2545, 1.5875),
        (92.270683803, 4.2545, 1.5875),
        (89.29642955, 21.122334072, 1.5875),
        (70.24642955, 21.122334072, 1.5875),
        (43.064181291, 21.122334072, 1.5875),
        (40.089927038, 4.2545, 1.5875),
        (59.139927038, 4.2545, 1.5875),
        (62.114181291, 21.122334072, 1.5875),
    ]]
    fillet(fillet2_edges, radius=FILLET2_R)


solid = part.part
